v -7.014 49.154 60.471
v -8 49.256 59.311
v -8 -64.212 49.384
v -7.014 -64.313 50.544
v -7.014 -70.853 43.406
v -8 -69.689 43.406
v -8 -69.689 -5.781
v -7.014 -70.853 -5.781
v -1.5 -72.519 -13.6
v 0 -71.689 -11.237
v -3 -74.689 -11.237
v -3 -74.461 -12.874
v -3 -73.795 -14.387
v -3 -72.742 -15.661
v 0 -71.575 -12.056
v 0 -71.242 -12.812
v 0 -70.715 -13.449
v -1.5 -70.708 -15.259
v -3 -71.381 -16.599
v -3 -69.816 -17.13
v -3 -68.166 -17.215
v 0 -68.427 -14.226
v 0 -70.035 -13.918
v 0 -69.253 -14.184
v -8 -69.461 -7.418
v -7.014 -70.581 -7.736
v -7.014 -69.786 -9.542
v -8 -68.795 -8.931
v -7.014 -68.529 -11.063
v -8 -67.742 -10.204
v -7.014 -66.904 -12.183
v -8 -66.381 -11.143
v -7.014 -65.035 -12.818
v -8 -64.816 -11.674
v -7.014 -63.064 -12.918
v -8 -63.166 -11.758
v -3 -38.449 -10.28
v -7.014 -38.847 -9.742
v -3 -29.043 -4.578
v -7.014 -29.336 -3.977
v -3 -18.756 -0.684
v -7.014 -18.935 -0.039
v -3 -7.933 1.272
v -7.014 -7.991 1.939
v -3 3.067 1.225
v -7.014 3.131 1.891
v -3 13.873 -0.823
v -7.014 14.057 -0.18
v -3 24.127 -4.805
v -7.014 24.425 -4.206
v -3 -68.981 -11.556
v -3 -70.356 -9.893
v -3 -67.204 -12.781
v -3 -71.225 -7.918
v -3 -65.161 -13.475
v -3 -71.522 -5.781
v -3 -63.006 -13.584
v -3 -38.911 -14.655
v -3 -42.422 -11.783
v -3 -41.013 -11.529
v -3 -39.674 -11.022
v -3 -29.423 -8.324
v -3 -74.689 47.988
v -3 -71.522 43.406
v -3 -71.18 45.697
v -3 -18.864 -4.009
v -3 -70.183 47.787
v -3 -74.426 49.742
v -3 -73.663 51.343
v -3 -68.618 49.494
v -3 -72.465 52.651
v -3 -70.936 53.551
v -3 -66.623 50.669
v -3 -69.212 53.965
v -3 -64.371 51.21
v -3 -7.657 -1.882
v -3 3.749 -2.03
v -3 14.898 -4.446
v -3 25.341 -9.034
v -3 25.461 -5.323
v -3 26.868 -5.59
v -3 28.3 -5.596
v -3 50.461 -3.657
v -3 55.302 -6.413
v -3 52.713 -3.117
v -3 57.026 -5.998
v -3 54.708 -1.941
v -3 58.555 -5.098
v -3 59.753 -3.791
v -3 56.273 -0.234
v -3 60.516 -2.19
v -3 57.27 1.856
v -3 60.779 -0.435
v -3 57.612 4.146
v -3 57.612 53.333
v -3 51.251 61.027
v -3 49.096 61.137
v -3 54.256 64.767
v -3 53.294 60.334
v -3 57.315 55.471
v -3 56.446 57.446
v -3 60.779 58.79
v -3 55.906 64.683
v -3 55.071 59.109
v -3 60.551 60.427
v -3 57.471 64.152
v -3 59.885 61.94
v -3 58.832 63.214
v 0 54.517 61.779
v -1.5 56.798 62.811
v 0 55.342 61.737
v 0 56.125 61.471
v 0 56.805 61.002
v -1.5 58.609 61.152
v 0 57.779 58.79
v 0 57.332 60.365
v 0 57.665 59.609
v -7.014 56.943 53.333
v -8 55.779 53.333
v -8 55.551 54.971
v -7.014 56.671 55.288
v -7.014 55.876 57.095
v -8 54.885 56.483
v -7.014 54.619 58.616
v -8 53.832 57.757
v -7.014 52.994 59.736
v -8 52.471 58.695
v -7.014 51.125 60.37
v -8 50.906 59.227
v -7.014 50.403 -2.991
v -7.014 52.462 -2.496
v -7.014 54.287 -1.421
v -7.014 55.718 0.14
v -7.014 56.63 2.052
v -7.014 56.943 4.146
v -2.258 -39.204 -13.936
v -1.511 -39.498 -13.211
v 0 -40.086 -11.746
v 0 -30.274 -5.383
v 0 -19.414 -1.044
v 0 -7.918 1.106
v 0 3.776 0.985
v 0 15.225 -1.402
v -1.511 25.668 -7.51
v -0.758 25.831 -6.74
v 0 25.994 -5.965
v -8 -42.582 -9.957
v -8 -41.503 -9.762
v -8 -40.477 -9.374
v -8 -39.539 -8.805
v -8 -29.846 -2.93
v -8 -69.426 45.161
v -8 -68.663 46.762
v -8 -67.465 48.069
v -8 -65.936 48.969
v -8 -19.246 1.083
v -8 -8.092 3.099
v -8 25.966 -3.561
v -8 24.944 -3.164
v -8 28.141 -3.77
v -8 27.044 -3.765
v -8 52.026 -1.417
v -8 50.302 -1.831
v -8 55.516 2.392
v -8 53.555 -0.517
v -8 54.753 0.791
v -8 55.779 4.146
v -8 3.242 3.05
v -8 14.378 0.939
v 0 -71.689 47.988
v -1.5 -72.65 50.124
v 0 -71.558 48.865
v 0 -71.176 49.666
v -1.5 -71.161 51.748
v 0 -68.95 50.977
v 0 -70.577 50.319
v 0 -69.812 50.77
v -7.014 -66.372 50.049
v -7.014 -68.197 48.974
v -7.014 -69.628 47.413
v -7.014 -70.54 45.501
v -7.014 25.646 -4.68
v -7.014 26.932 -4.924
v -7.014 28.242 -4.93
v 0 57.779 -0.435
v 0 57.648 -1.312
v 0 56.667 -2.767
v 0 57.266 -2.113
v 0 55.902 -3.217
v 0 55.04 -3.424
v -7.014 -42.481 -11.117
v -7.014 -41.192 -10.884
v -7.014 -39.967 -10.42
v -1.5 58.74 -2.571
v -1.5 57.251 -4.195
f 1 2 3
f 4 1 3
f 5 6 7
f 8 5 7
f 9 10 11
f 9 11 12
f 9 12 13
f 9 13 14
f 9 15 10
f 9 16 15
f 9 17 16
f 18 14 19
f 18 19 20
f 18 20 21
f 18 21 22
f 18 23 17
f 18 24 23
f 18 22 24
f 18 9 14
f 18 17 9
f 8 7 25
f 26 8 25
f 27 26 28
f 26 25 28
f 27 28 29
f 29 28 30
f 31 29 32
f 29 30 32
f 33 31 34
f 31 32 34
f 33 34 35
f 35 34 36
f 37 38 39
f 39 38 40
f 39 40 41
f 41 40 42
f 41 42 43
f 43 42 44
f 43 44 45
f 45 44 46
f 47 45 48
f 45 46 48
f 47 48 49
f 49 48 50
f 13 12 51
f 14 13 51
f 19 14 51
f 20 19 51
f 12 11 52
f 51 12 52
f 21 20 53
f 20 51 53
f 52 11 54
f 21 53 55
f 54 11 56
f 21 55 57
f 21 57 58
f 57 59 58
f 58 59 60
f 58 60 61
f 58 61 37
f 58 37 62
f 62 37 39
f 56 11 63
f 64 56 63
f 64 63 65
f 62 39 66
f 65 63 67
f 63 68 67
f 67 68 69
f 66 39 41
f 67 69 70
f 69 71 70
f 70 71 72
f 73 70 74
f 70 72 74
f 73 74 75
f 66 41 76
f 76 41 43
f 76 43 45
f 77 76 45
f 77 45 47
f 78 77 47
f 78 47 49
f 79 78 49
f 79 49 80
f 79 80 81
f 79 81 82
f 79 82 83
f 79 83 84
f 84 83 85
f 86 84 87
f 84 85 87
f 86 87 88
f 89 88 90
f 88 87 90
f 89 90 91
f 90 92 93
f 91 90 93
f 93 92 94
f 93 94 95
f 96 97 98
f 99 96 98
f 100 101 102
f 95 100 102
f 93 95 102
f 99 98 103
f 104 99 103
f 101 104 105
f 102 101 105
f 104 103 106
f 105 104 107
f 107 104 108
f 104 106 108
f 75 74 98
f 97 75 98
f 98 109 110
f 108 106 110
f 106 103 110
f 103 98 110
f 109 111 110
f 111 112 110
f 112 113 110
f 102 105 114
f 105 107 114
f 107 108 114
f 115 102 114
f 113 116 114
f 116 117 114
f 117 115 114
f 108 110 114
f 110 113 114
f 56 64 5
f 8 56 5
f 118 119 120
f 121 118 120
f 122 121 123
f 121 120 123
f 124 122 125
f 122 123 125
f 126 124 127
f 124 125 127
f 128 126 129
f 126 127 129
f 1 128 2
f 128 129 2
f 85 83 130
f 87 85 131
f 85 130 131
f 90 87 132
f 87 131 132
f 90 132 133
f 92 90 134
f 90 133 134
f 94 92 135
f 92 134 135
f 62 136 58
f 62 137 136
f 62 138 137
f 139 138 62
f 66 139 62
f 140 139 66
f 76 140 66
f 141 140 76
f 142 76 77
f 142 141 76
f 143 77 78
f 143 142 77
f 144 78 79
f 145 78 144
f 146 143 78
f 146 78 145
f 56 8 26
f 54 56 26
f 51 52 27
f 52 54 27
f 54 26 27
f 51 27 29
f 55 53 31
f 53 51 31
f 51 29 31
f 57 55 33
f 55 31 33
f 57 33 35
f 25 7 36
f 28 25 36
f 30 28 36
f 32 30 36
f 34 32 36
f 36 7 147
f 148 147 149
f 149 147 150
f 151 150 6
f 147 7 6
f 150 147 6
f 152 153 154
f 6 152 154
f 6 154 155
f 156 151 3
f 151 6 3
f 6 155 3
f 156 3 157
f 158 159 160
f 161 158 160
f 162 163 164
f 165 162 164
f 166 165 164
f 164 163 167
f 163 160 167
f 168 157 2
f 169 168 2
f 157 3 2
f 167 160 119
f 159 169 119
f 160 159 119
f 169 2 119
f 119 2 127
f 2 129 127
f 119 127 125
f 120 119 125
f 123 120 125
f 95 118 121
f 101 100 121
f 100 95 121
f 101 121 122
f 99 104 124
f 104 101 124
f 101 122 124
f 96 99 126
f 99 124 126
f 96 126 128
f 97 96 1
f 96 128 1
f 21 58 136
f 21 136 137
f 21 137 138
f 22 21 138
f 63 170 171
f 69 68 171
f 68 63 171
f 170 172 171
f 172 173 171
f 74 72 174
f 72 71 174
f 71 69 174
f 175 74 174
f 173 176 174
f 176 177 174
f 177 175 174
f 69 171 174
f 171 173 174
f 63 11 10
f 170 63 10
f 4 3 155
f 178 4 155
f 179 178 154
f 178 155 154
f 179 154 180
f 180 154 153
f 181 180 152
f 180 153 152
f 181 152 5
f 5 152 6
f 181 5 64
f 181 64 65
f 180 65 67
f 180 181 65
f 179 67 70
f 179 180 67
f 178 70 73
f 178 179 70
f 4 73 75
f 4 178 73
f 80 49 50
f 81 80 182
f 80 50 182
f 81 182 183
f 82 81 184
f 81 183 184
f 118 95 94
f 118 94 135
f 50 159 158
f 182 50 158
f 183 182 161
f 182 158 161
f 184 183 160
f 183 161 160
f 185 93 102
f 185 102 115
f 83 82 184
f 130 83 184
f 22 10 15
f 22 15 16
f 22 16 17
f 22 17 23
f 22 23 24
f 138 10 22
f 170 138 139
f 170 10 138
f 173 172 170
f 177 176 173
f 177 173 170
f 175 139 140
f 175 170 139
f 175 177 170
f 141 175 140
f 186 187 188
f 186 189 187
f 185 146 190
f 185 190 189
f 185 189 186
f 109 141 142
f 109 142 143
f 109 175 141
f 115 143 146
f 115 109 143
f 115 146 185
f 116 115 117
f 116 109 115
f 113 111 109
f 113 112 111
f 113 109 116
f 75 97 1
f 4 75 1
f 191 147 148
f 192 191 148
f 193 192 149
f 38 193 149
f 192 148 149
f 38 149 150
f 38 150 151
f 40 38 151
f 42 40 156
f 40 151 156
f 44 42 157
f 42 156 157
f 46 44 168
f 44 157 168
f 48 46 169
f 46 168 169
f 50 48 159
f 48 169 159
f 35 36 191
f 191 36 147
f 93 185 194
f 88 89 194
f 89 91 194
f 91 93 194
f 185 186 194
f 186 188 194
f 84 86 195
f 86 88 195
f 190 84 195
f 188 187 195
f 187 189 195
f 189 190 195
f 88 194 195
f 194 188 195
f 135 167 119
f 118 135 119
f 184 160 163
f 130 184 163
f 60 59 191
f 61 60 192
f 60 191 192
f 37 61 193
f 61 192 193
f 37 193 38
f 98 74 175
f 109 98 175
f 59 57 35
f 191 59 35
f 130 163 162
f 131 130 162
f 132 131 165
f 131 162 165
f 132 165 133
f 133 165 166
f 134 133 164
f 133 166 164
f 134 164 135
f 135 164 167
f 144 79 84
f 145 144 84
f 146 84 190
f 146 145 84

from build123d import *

# Parameters (mm, degrees)
F1_DEPTH     = 3
F2_DEPTH     = 8
F3_R         = 8
F4_T4_DEPTH  = 113.9006842239
F4_T9_ANGLE  = 95
F4_T14_ANGLE = 85
F4_T19_DEPTH = 49.1871720396
F4_T24_ANGLE = 95
F4_T29_DEPTH = 20.662188907
F4_T34_ANGLE = 31.4669762933
F4_T39_ANGLE = 62.9339525865
F4_T44_ANGLE = 31.4669762933
F4_T49_DEPTH = 22.2455379196
F4_T54_ANGLE = 85
F4_T59_DEPTH = 49.1871720396
F5_SIZE      = 1
F6_T1_DEPTH  = 123.9388825993
F6_T3_DEPTH  = 59.2253704151
F6_T5_DEPTH  = 42.8508484491
F6_T7_DEPTH  = 59.2253704151
F6_T9_DEPTH  = 43.5593108265
F6_T12_ANGLE = 96.9904356043
F6_T14_ANGLE = 95
F6_T16_ANGLE = 85
F6_T18_ANGLE = 95
F6_T20_ANGLE = 85


# Not quite as in the source:
# - a fillet or chamfer that OpenCascade refuses, or shapes differently, is made with other operations: its cross-section is extruded or revolved along the edge and cut away or added


with BuildPart() as f1:
    # F0 (on Right) → F1 (new body)
    with BuildSketch(Plane.YZ):
        with BuildLine():
            Line((-76.6886542646, 55.3186824411), (-76.6886542646, -19.9678053747))
            Line((-76.6886542646, -19.9678053747), (-38.1131050777, -16.5928821315))
            ThreePointArc((-38.1131050777, -16.5928821315), (-7.4822201157, -3.8748285682), (24.8917797013, -11.0806689666))
            Line((24.8917797013, -11.0806689666), (62.7786034683, -7.76600139))
            Line((62.7786034683, -7.76600139), (62.7786034683, 67.5204864257))
            Line((62.7786034683, 67.5204864257), (-76.6886542646, 55.3186824411))
        make_face()
        with BuildLine():
            Line((-40.0864817191, -11.7464310288), (-71.6886542646, -14.5112628693))
            Line((-71.6886542646, -14.5112628693), (-71.6886542646, 50.737026571))
            Line((-71.6886542646, 50.737026571), (57.7786034683, 62.0639439204))
            Line((57.7786034683, 62.0639439204), (57.7786034683, -3.1843455199))
            Line((57.7786034683, -3.1843455199), (25.9935989152, -5.9651730884))
            ThreePointArc((25.9935989152, -5.9651730884), (-7.9179988294, 1.1061449223), (-40.0864817191, -11.7464310288))
        make_face(mode=Mode.SUBTRACT)
        with BuildLine():
            Line((-71.6886542646, 50.737026571), (-71.6886542646, -14.5112628693))
            Line((-71.6886542646, -14.5112628693), (-40.0864817191, -11.7464310288))
            ThreePointArc((-40.0864817191, -11.7464310288), (-7.9179988294, 1.1061449223), (25.9935989152, -5.9651730884))
            Line((25.9935989152, -5.9651730884), (57.7786034683, -3.1843455199))
            Line((57.7786034683, -3.1843455199), (57.7786034683, 62.0639439204))
            Line((57.7786034683, 62.0639439204), (-71.6886542646, 50.737026571))
        make_face()
    extrude(amount=-F1_DEPTH)

    # F0 (on Right) → F2 (join)
    with BuildSketch(Plane.YZ):
        with BuildLine():
            Line((-71.6886542646, 50.737026571), (-71.6886542646, -14.5112628693))
            Line((-71.6886542646, -14.5112628693), (-40.0864817191, -11.7464310288))
            ThreePointArc((-40.0864817191, -11.7464310288), (-7.9179988294, 1.1061449223), (25.9935989152, -5.9651730884))
            Line((25.9935989152, -5.9651730884), (57.7786034683, -3.1843455199))
            Line((57.7786034683, -3.1843455199), (57.7786034683, 62.0639439204))
            Line((57.7786034683, 62.0639439204), (-71.6886542646, 50.737026571))
        make_face()
    extrude(amount=-F2_DEPTH)

    # F3
    f3_edges = [f1.edges().sort_by_distance(p)[0] for p in [
        (-5.5, 57.778603, 62.063944),
        (-5.5, -71.688654, 50.737027),
        (-5.5, -71.688654, -14.511263),
        (-5.5, -40.086482, -11.746431),
        (-5.5, 25.993599, -5.965173),
        (-5.5, 57.778603, -3.184346),
        (-1.5, -76.688654, 55.318682),
        (-1.5, -76.688654, -19.967805),
        (-1.5, 62.778603, -7.766001),
        (-1.5, 62.778603, 67.520486),
    ]]
    fillet(f3_edges, radius=F3_R)

    # F4: chamfer of 1 x 6 on 1 edges, made by hand


with BuildPart() as f4_tool2:
    # F4_s3 → F4_t4 (new body)
    with BuildSketch(Plane(origin=(0, 54.0311094993, 4.7271095589), x_dir=(1, 0, 0), z_dir=(0, -0.9961946981, -0.0871557427))):
        Polygon((-2, 56.792034776), (-8, 55.792034776), (-8, 56.792034776), align=None)
    extrude(amount=F4_T4_DEPTH)

    split(bisect_by=Plane.YZ.offset(-3), keep=Keep.BOTTOM)


with BuildPart() as f1_1:
    add(f1.part)

    # F4_t1: cut F4_tool2
    add(f4_tool2.part, mode=Mode.SUBTRACT)


with BuildPart() as f4_tool7:
    # F4_s8 → F4_t9 (revolve)
    with BuildSketch(Plane.XY.offset(53.3334759118)):
        Polygon((-2, 57.7786034683), (-8, 56.7786034683), (-8, 57.7786034683), align=None)
    revolve(axis=Axis((-8, 49.7786034683, 53.3334759118), (1, 0, 0)), revolution_arc=F4_T9_ANGLE)

    split(bisect_by=Plane.YZ.offset(-3), keep=Keep.BOTTOM)


with BuildPart() as f1_2:
    add(f1_1.part)

    # F4_t6: cut F4_tool7
    add(f4_tool7.part, mode=Mode.SUBTRACT)


with BuildPart() as f4_tool12:
    # F4_s13 → F4_t14 (revolve)
    with BuildSketch(Plane.XY.offset(43.4063771788)):
        Polygon((-2, -71.6886542646), (-8, -70.6886542646), (-8, -71.6886542646), align=None)
    revolve(axis=Axis((-8, -63.6886542646, 43.4063771788), (-1, 0, 0)), revolution_arc=F4_T14_ANGLE)

    split(bisect_by=Plane.YZ.offset(-3), keep=Keep.BOTTOM)


with BuildPart() as f1_3:
    add(f1_2.part)

    # F4_t11: cut F4_tool12
    add(f4_tool12.part, mode=Mode.SUBTRACT)


with BuildPart() as f4_tool17:
    # F4_s18 → F4_t19 (new body)
    with BuildSketch(Plane.XY.offset(43.4063771788)):
        Polygon((-2, -71.6886542646), (-8, -70.6886542646), (-8, -71.6886542646), align=None)
    extrude(amount=-F4_T19_DEPTH)

    split(bisect_by=Plane.YZ.offset(-3), keep=Keep.BOTTOM)


with BuildPart() as f1_4:
    add(f1_3.part)

    # F4_t16: cut F4_tool17
    add(f4_tool17.part, mode=Mode.SUBTRACT)


with BuildPart() as f4_tool22:
    # F4_s23 → F4_t24 (revolve)
    with BuildSketch(Plane.XY.offset(-5.7807948608)):
        Polygon((-2, -71.6886542646), (-8, -70.6886542646), (-8, -71.6886542646), align=None)
    revolve(axis=Axis((-8, -63.6886542646, -5.7807948608), (1, 0, 0)), revolution_arc=F4_T24_ANGLE)

    split(bisect_by=Plane.YZ.offset(-3), keep=Keep.BOTTOM)


with BuildPart() as f1_5:
    add(f1_4.part)

    # F4_t21: cut F4_tool22
    add(f4_tool22.part, mode=Mode.SUBTRACT)


with BuildPart() as f4_tool27:
    # F4_s28 → F4_t29 (new body)
    with BuildSketch(Plane(origin=(0, -63.7067796281, -5.5736210072), x_dir=(1, 0, 0), z_dir=(0, 0.9961946981, 0.0871557427))):
        Polygon((-2, 8.207965224), (-8, 7.207965224), (-8, 8.207965224), align=None)
    extrude(amount=F4_T29_DEPTH)

    split(bisect_by=Plane.YZ.offset(-3), keep=Keep.BOTTOM)


with BuildPart() as f1_6:
    add(f1_5.part)

    # F4_t26: cut F4_tool27
    add(f4_tool27.part, mode=Mode.SUBTRACT)


with BuildPart() as f4_tool32:
    # F4_s33 → F4_t34 (revolve)
    with BuildSketch(Plane(origin=(0, -43.123216588, -3.7727925862), x_dir=(1, 0, 0), z_dir=(0, -0.9961946981, -0.0871557427))):
        Polygon((-2, -8.207965224), (-8, -7.207965224), (-8, -8.207965224), align=None)
    revolve(axis=Axis((-8, -43.1050912244, -3.9799664398), (1, 0, 0)), revolution_arc=F4_T34_ANGLE)

    split(bisect_by=Plane.YZ.offset(-3), keep=Keep.BOTTOM)


with BuildPart() as f1_7:
    add(f1_6.part)

    # F4_t31: cut F4_tool32
    add(f4_tool32.part, mode=Mode.SUBTRACT)


with BuildPart() as f4_tool37:
    # F4_s38 → F4_t39 (revolve)
    with BuildSketch(Plane(origin=(0, -29.7800133865, -22.0094994379), x_dir=(1, 0, 0), z_dir=(0, -0.8041995665, -0.5943593671))):
        Polygon((-2, 14.4192274514), (-8, 15.4192274514), (-8, 14.4192274514), align=None)
    revolve(axis=Axis((-8, -2.6886542646, -58.6655369632), (-1, 0, 0)), revolution_arc=F4_T39_ANGLE)

    split(bisect_by=Plane.YZ.offset(-3), keep=Keep.BOTTOM)


with BuildPart() as f1_8:
    add(f1_7.part)

    # F4_t36: cut F4_tool37
    add(f4_tool37.part, mode=Mode.SUBTRACT)


with BuildPart() as f4_tool42:
    # F4_s43 → F4_t44 (revolve)
    with BuildSketch(Plane(origin=(0, 21.2512251902, -10.5801809941), x_dir=(1, 0, 0), z_dir=(0, -0.895191389, 0.4456819235))):
        Polygon((-2, 6.2848318723), (-8, 7.2848318723), (-8, 6.2848318723), align=None)
    revolve(axis=Axis((-8, 27.6177165365, 2.207477492), (1, 0, 0)), revolution_arc=F4_T44_ANGLE)

    split(bisect_by=Plane.YZ.offset(-3), keep=Keep.BOTTOM)


with BuildPart() as f1_9:
    add(f1_8.part)

    # F4_t41: cut F4_tool42
    add(f4_tool42.part, mode=Mode.SUBTRACT)


with BuildPart() as f4_tool47:
    # F4_s48 → F4_t49 (new body)
    with BuildSketch(Plane(origin=(0, 27.599591173, 2.4146513456), x_dir=(1, 0, 0), z_dir=(0, 0.9961946981, 0.0871557427))):
        Polygon((-2, 8.207965224), (-8, 7.207965224), (-8, 8.207965224), align=None)
    extrude(amount=F4_T49_DEPTH)

    split(bisect_by=Plane.YZ.offset(-3), keep=Keep.BOTTOM)


with BuildPart() as f1_10:
    add(f1_9.part)

    # F4_t46: cut F4_tool47
    add(f4_tool47.part, mode=Mode.SUBTRACT)


with BuildPart() as f4_tool52:
    # F4_s53 → F4_t54 (revolve)
    with BuildSketch(Plane(origin=(0, 49.7604781047, 4.3534777258), x_dir=(1, 0, 0), z_dir=(0, -0.9961946981, -0.0871557427))):
        Polygon((-2, -8.207965224), (-8, -7.207965224), (-8, -8.207965224), align=None)
    revolve(axis=Axis((-8, 49.7786034683, 4.1463038722), (1, 0, 0)), revolution_arc=F4_T54_ANGLE)

    split(bisect_by=Plane.YZ.offset(-3), keep=Keep.BOTTOM)


with BuildPart() as f1_11:
    add(f1_10.part)

    # F4_t51: cut F4_tool52
    add(f4_tool52.part, mode=Mode.SUBTRACT)


with BuildPart() as f4_tool57:
    # F4_s58 → F4_t59 (new body)
    with BuildSketch(Plane.XY.offset(4.1463038722)):
        Polygon((-2, 57.7786034683), (-8, 56.7786034683), (-8, 57.7786034683), align=None)
    extrude(amount=F4_T59_DEPTH)

    split(bisect_by=Plane.YZ.offset(-3), keep=Keep.BOTTOM)


with BuildPart() as f1_12:
    add(f1_11.part)

    # F4_t56: cut F4_tool57
    add(f4_tool57.part, mode=Mode.SUBTRACT)

    # F5
    f5_edges = [f1_12.edges().sort_by_distance(p)[0] for p in [
        (-8, -7.565116, 55.343289),
        (-8, -68.849596, 48.135509),
        (-8, 54.507735, 58.494417),
        (-8, 54.939545, -0.582828),
        (-8, 39.30825, -3.796472),
        (-8, 26.31403, -4.670051),
        (-8, -8.005155, 2.10234),
        (-8, -40.626941, -10.526627),
        (-8, -52.786783, -11.853744),
        (-8, -68.417786, -10.941736),
        (-8, -70.688654, 18.812791),
        (-8, 56.778603, 28.73989),
    ]]
    chamfer(f5_edges, length=F5_SIZE)

    # F6: chamfer of 5 on 2 edges, made by hand

    # F6_s2 → F6_t1 (cut)
    with BuildSketch(Plane(origin=(0, 59.4668882131, 5.2026785738), x_dir=(1, 0, 0), z_dir=(0, -0.9961946981, -0.0871557427))):
        Polygon((-5, 61.792034776), (0, 56.792034776), (0, 61.792034776), align=None)
    extrude(amount=F6_T1_DEPTH, mode=Mode.SUBTRACT)

    # F6_s4 → F6_t3 (cut)
    with BuildSketch(Plane.XY.offset(-11.2373373661)):
        Polygon((-5, -76.6886542646), (0, -71.6886542646), (0, -76.6886542646), align=None)
    extrude(amount=F6_T3_DEPTH, mode=Mode.SUBTRACT)

    # F6_s6 → F6_t5 (cut)
    with BuildSketch(Plane(origin=(0, -69.1425583419, -6.0491900221), x_dir=(1, 0, 0), z_dir=(0, 0.9961946981, 0.0871557427))):
        Polygon((-5, 13.207965224), (0, 8.207965224), (0, 13.207965224), align=None)
    extrude(amount=F6_T5_DEPTH, mode=Mode.SUBTRACT)

    # F6_s8 → F6_t7 (cut)
    with BuildSketch(Plane.XY.offset(-0.4353519979)):
        Polygon((-5, 62.7786034683), (0, 57.7786034683), (0, 62.7786034683), align=None)
    extrude(amount=F6_T7_DEPTH, mode=Mode.SUBTRACT)

    # F6_s10 → F6_t9 (cut)
    with BuildSketch(Plane(origin=(0, 10.9311448931, 0.9563512575), x_dir=(1, 0, 0), z_dir=(0, 0.9961946981, 0.0871557427))):
        Polygon((-5, 13.207965224), (0, 8.207965224), (0, 13.207965224), align=None)
    extrude(amount=F6_T9_DEPTH, mode=Mode.SUBTRACT)

    # F6_s11 → F6_t12 (revolve, cut)
    with BuildSketch(Plane(origin=(0, -29.0039957446, -39.1898093404), x_dir=(1, 0, 0), z_dir=(0, -0.5948898787, -0.8038072109))):
        Polygon((-5, 22.2616255192), (0, 27.2616255192), (0, 22.2616255192), align=None)
    revolve(axis=Axis((0, -2.6886542646, -58.6655369632), (-1, 0, 0)), revolution_arc=F6_T12_ANGLE, mode=Mode.SUBTRACT)

    # F6_s13 → F6_t14 (revolve, cut)
    with BuildSketch(Plane(origin=(0, 59.4668882131, 5.2026785738), x_dir=(1, 0, 0), z_dir=(0, -0.9961946981, -0.0871557427))):
        Polygon((-5, 61.792034776), (0, 56.792034776), (0, 61.792034776), align=None)
    revolve(axis=Axis((0, 54.7786034683, 58.7900184172), (-1, 0, 0)), revolution_arc=F6_T14_ANGLE, mode=Mode.SUBTRACT)

    # F6_s15 → F6_t16 (revolve, cut)
    with BuildSketch(Plane.XY.offset(47.9880330489)):
        Polygon((-5, -76.6886542646), (0, -71.6886542646), (0, -76.6886542646), align=None)
    revolve(axis=Axis((0, -68.6886542646, 47.9880330489), (-1, 0, 0)), revolution_arc=F6_T16_ANGLE, mode=Mode.SUBTRACT)

    # F6_s17 → F6_t18 (revolve, cut)
    with BuildSketch(Plane.XY.offset(-11.2373373661)):
        Polygon((-5, -76.6886542646), (0, -71.6886542646), (0, -76.6886542646), align=None)
    revolve(axis=Axis((0, -68.6886542646, -11.2373373661), (1, 0, 0)), revolution_arc=F6_T18_ANGLE, mode=Mode.SUBTRACT)

    # F6_s19 → F6_t20 (revolve, cut)
    with BuildSketch(Plane.XY.offset(-0.4353519979)):
        Polygon((-5, 62.7786034683), (0, 57.7786034683), (0, 62.7786034683), align=None)
    revolve(axis=Axis((0, 54.7786034683, -0.4353519979), (-1, 0, 0)), revolution_arc=F6_T20_ANGLE, mode=Mode.SUBTRACT)


solid = f1_12.part
